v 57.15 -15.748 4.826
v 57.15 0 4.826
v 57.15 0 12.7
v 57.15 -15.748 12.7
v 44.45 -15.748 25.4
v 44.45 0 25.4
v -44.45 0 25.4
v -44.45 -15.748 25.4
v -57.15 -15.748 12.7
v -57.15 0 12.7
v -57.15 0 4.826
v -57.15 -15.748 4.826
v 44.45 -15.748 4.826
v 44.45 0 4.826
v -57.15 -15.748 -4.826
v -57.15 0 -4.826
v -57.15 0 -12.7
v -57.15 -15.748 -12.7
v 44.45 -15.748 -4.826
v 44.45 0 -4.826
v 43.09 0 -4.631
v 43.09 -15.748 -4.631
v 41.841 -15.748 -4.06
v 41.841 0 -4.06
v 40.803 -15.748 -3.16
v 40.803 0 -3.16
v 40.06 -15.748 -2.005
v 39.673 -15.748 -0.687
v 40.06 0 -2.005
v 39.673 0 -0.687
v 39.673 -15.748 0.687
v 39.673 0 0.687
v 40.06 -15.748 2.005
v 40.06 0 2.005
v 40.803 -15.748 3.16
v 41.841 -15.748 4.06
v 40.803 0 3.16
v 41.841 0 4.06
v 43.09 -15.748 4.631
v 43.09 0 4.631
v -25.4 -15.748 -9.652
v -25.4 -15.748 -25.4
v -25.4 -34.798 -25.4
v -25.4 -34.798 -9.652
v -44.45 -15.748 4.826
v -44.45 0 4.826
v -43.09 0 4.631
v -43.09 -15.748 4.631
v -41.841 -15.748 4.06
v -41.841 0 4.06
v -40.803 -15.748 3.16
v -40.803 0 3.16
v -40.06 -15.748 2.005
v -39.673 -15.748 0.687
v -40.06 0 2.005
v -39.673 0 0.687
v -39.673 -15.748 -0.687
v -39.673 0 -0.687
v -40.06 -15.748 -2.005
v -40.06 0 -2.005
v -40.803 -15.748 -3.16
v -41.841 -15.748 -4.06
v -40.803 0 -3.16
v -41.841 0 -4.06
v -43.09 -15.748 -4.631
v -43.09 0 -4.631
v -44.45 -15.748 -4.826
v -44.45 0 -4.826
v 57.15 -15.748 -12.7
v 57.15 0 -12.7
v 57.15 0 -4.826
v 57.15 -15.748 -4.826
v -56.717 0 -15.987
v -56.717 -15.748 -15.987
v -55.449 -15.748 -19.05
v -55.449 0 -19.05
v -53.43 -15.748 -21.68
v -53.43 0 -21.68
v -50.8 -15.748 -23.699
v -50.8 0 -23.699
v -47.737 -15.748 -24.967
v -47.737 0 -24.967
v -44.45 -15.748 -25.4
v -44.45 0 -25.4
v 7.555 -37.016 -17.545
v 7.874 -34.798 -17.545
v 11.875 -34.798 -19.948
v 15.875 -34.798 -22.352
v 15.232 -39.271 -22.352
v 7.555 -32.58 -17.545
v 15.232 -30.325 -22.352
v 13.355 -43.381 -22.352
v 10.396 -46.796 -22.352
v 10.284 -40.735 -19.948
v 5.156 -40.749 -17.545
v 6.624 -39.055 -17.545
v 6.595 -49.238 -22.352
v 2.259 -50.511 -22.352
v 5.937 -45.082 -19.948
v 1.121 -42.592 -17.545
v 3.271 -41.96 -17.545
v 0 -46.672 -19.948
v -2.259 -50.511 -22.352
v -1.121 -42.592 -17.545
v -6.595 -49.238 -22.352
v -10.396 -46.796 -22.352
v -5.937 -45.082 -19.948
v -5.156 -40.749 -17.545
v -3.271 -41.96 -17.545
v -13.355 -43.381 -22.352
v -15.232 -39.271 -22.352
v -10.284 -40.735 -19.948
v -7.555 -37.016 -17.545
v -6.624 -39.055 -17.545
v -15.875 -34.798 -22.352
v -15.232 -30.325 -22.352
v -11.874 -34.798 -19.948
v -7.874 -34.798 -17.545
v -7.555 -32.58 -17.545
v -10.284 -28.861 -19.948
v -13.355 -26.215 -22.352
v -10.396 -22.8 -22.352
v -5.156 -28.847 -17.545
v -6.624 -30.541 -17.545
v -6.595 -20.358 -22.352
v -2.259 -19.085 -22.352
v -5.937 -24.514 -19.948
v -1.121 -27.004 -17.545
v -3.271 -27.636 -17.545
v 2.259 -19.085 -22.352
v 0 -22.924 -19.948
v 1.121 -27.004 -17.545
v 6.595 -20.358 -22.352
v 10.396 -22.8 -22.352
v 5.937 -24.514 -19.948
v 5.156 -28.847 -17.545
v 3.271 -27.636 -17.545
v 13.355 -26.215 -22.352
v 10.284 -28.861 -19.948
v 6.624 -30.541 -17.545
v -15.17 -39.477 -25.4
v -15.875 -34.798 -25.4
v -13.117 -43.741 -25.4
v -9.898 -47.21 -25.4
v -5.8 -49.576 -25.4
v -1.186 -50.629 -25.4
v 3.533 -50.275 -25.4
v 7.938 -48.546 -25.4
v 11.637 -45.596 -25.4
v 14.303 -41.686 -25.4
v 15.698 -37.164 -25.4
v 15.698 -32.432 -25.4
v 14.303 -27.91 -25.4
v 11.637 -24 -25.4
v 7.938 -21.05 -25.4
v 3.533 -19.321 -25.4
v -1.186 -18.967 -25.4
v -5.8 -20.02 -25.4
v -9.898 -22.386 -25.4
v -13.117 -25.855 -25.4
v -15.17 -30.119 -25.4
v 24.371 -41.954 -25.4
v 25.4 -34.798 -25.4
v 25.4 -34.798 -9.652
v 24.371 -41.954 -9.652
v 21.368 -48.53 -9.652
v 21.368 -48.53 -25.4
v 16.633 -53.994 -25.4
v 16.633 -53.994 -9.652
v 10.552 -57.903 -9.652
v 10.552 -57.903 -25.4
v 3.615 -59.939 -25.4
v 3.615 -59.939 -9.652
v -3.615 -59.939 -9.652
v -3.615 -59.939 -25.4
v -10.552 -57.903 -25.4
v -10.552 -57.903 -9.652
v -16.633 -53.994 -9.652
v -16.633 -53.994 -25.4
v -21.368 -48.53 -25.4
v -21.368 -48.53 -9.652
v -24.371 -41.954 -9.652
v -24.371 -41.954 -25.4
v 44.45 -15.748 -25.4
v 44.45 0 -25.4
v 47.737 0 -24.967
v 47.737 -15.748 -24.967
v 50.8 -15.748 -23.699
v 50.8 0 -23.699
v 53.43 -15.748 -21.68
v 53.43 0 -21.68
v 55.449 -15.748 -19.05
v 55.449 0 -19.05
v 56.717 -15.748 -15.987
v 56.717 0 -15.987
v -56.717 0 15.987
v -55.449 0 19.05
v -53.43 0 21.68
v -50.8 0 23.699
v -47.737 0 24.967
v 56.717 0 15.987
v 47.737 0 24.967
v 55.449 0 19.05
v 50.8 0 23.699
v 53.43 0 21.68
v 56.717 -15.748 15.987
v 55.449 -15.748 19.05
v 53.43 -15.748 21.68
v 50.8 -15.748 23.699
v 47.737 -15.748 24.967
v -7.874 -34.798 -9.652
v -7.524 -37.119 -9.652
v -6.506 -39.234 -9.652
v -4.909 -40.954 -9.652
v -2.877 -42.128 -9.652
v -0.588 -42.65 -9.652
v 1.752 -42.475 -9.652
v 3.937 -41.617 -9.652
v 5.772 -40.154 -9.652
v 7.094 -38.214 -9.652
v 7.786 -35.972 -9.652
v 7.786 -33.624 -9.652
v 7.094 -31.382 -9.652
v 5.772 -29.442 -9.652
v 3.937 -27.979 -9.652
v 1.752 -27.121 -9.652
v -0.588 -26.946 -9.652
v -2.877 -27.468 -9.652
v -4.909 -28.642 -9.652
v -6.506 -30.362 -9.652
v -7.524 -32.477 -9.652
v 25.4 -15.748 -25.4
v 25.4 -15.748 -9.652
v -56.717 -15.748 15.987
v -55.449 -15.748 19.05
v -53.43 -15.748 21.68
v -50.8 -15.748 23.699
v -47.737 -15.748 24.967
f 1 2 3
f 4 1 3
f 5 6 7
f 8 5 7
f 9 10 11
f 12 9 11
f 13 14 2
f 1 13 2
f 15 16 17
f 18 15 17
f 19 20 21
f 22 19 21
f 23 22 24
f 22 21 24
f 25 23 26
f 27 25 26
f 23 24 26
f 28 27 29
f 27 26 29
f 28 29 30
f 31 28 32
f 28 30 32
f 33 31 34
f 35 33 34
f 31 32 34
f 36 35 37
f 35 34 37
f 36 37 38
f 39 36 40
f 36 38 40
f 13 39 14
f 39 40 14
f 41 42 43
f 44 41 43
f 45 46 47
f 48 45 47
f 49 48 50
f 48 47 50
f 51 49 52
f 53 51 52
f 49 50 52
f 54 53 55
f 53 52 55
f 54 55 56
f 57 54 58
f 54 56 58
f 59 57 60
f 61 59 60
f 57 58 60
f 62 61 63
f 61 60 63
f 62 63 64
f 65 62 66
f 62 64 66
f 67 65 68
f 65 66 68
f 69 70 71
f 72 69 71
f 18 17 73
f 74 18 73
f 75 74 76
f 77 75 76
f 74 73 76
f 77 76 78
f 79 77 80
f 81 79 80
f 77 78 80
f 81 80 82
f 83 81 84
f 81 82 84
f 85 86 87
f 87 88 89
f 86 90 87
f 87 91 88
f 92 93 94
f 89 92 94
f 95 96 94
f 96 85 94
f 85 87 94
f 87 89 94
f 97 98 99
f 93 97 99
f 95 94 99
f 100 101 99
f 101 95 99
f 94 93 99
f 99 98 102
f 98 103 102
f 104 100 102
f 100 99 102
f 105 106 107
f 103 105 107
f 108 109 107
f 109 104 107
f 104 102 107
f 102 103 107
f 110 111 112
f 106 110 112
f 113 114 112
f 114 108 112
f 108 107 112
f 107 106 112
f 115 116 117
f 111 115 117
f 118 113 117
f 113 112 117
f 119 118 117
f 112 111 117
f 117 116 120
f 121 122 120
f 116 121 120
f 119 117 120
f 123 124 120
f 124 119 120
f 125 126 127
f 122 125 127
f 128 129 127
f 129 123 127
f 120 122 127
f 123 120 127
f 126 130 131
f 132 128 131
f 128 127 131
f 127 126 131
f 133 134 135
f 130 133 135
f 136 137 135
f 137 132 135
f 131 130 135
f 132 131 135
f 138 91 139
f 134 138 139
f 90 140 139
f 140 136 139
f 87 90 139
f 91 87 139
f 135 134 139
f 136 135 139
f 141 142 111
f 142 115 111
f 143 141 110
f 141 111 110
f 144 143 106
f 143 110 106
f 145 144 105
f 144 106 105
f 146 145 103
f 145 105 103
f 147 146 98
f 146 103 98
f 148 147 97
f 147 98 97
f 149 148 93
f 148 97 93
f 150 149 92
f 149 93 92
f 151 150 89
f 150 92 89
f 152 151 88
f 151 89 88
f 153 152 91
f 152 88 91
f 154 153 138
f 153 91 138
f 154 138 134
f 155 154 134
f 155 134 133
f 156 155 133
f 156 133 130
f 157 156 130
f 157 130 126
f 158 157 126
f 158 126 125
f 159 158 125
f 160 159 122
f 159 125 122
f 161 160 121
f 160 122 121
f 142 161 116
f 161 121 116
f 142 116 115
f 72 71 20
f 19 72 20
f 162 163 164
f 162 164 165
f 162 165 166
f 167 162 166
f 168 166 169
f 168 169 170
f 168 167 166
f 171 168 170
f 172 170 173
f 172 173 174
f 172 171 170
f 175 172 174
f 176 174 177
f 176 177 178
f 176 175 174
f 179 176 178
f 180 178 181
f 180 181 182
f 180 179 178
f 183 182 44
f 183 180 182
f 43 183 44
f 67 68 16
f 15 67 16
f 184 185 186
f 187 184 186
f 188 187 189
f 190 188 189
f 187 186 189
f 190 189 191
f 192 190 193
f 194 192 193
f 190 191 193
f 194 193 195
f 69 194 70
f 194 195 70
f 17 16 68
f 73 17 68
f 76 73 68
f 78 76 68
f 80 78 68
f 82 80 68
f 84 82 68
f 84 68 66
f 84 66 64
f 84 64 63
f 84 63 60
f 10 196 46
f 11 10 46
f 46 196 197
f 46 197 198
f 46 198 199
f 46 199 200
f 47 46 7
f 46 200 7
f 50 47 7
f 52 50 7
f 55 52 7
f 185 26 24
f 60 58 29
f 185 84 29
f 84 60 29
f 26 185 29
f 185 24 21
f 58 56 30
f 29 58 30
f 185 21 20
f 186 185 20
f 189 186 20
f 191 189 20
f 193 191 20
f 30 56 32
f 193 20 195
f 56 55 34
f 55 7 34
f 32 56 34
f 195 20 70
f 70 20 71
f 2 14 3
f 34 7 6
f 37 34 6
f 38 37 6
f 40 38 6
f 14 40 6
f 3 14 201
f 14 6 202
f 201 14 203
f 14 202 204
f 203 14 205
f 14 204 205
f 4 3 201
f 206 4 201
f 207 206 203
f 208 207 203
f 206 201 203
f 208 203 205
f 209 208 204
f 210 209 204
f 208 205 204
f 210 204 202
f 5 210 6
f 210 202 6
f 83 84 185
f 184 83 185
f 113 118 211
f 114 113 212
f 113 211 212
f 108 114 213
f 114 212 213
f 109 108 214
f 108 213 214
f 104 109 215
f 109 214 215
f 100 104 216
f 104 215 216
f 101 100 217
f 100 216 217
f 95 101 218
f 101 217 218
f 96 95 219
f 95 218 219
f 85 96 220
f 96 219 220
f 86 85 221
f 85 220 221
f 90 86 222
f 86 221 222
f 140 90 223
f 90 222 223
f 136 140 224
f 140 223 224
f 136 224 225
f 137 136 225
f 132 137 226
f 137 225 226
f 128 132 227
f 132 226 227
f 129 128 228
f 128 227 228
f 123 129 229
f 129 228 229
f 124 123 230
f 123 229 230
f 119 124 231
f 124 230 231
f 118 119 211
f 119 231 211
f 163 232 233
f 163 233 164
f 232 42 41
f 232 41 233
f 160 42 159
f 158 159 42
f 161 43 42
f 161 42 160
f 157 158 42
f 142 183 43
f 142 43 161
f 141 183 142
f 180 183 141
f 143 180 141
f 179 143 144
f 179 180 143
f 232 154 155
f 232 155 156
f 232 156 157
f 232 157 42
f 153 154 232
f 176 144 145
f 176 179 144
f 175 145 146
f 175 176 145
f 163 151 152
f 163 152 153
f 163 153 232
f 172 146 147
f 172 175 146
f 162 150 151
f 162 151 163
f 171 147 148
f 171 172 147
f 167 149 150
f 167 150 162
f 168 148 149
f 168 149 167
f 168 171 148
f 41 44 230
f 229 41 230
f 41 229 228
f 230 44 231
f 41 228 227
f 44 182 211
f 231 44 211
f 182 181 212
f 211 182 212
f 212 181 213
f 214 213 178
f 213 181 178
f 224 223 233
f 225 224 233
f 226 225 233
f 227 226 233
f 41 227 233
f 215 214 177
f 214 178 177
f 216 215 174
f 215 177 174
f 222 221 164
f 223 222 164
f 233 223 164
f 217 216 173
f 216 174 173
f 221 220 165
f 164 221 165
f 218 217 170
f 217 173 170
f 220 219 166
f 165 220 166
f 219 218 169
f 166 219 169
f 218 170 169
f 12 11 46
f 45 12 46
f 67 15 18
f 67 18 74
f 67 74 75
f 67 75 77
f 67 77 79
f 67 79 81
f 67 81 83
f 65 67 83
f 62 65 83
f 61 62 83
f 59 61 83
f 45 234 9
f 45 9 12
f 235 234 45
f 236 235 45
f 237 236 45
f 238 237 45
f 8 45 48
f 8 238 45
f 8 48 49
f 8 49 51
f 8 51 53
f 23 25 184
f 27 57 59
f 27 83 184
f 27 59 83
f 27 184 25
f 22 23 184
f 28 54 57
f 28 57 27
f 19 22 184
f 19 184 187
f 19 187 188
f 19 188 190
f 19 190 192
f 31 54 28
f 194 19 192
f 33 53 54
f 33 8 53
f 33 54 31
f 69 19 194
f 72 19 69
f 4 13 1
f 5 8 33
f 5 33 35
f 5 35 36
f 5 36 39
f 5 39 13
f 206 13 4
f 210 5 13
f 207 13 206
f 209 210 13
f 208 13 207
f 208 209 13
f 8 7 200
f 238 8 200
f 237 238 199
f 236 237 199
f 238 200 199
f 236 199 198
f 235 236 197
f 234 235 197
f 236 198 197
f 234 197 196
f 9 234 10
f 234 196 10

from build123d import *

# Parameters (mm, degrees)
F0_W     = 50.8
F0_H     = 15.748
F1_DEPTH = 15.748
F2_W     = 50.8
F2_H     = 19.05
F3_DEPTH = 15.748
F5_D     = 15.748
F7_D     = 31.75
F7_DEPTH = 3.048
F7_TIP   = 9.5386623271


with BuildPart() as f1:
    # F0 (on Front) → F1 (new body)
    with BuildSketch(Plane.XZ):
        with BuildLine():
            Line((44.45, 25.4), (-44.45, 25.4))
            ThreePointArc((-44.45, 25.4), (-53.4302561211, 21.6802561211), (-57.15, 12.7))
            Line((-57.15, 12.7), (-57.15, 4.826))
            Line((-57.15, 4.826), (-44.45, 4.826))
            ThreePointArc((-44.45, 4.826), (-39.624, 0), (-44.45, -4.826))
            Line((-44.45, -4.826), (-57.15, -4.826))
            Line((-57.15, -4.826), (-57.15, -12.7))
            ThreePointArc((-57.15, -12.7), (-53.4302561211, -21.6802561211), (-44.45, -25.4))
            Line((-44.45, -25.4), (-25.4, -25.4))
            Line((-25.4, -25.4), (-25.4, -9.652))
            Line((-25.4, -9.652), (25.4, -9.652))
            Line((25.4, -9.652), (25.4, -25.4))
            Line((25.4, -25.4), (44.45, -25.4))
            ThreePointArc((44.45, -25.4), (53.4302561211, -21.6802561211), (57.15, -12.7))
            Line((57.15, -12.7), (57.15, -4.826))
            Line((57.15, -4.826), (44.45, -4.826))
            ThreePointArc((44.45, -4.826), (39.624, 0), (44.45, 4.826))
            Line((44.45, 4.826), (57.15, 4.826))
            Line((57.15, 4.826), (57.15, 12.7))
            ThreePointArc((57.15, 12.7), (53.4302561211, 21.6802561211), (44.45, 25.4))
        make_face()
        with Locations((0, -17.526)):
            Rectangle(F0_W, F0_H)
    extrude(amount=F1_DEPTH)


with BuildPart() as f3:
    # F2 (on face) → F3 (new body)
    with BuildSketch(Plane(origin=(0, 0, -25.4), x_dir=(1, 0, 0), z_dir=(0, 0, -1))):
        with Locations((0, 25.273)):
            Rectangle(F2_W, F2_H)
        with BuildLine():
            ThreePointArc((25.4, 34.798), (0, 60.198), (-25.4, 34.798))
            Line((-25.4, 34.798), (25.4, 34.798))
        make_face()
    extrude(amount=-F3_DEPTH)

    # F5 (through all)
    with Locations(Plane(origin=(0, 0, -25.4), x_dir=(1, 0, 0), z_dir=(0, 0, -1))):
        with Locations((0, 34.798)):
            Hole(F5_D / 2)

    # F7
    with Locations(Plane(origin=(0, 0, -25.4), x_dir=(1, 0, 0), z_dir=(0, 0, -1))):
        with Locations((0, 34.798)):
            Hole(F7_D / 2, depth=F7_DEPTH)
            with Locations((0, 0, -(F7_DEPTH + F7_TIP / 2))):  # 118° drill point
                Cone(0, F7_D / 2, F7_TIP, mode=Mode.SUBTRACT)


solid = Compound([f1.part, f3.part])
